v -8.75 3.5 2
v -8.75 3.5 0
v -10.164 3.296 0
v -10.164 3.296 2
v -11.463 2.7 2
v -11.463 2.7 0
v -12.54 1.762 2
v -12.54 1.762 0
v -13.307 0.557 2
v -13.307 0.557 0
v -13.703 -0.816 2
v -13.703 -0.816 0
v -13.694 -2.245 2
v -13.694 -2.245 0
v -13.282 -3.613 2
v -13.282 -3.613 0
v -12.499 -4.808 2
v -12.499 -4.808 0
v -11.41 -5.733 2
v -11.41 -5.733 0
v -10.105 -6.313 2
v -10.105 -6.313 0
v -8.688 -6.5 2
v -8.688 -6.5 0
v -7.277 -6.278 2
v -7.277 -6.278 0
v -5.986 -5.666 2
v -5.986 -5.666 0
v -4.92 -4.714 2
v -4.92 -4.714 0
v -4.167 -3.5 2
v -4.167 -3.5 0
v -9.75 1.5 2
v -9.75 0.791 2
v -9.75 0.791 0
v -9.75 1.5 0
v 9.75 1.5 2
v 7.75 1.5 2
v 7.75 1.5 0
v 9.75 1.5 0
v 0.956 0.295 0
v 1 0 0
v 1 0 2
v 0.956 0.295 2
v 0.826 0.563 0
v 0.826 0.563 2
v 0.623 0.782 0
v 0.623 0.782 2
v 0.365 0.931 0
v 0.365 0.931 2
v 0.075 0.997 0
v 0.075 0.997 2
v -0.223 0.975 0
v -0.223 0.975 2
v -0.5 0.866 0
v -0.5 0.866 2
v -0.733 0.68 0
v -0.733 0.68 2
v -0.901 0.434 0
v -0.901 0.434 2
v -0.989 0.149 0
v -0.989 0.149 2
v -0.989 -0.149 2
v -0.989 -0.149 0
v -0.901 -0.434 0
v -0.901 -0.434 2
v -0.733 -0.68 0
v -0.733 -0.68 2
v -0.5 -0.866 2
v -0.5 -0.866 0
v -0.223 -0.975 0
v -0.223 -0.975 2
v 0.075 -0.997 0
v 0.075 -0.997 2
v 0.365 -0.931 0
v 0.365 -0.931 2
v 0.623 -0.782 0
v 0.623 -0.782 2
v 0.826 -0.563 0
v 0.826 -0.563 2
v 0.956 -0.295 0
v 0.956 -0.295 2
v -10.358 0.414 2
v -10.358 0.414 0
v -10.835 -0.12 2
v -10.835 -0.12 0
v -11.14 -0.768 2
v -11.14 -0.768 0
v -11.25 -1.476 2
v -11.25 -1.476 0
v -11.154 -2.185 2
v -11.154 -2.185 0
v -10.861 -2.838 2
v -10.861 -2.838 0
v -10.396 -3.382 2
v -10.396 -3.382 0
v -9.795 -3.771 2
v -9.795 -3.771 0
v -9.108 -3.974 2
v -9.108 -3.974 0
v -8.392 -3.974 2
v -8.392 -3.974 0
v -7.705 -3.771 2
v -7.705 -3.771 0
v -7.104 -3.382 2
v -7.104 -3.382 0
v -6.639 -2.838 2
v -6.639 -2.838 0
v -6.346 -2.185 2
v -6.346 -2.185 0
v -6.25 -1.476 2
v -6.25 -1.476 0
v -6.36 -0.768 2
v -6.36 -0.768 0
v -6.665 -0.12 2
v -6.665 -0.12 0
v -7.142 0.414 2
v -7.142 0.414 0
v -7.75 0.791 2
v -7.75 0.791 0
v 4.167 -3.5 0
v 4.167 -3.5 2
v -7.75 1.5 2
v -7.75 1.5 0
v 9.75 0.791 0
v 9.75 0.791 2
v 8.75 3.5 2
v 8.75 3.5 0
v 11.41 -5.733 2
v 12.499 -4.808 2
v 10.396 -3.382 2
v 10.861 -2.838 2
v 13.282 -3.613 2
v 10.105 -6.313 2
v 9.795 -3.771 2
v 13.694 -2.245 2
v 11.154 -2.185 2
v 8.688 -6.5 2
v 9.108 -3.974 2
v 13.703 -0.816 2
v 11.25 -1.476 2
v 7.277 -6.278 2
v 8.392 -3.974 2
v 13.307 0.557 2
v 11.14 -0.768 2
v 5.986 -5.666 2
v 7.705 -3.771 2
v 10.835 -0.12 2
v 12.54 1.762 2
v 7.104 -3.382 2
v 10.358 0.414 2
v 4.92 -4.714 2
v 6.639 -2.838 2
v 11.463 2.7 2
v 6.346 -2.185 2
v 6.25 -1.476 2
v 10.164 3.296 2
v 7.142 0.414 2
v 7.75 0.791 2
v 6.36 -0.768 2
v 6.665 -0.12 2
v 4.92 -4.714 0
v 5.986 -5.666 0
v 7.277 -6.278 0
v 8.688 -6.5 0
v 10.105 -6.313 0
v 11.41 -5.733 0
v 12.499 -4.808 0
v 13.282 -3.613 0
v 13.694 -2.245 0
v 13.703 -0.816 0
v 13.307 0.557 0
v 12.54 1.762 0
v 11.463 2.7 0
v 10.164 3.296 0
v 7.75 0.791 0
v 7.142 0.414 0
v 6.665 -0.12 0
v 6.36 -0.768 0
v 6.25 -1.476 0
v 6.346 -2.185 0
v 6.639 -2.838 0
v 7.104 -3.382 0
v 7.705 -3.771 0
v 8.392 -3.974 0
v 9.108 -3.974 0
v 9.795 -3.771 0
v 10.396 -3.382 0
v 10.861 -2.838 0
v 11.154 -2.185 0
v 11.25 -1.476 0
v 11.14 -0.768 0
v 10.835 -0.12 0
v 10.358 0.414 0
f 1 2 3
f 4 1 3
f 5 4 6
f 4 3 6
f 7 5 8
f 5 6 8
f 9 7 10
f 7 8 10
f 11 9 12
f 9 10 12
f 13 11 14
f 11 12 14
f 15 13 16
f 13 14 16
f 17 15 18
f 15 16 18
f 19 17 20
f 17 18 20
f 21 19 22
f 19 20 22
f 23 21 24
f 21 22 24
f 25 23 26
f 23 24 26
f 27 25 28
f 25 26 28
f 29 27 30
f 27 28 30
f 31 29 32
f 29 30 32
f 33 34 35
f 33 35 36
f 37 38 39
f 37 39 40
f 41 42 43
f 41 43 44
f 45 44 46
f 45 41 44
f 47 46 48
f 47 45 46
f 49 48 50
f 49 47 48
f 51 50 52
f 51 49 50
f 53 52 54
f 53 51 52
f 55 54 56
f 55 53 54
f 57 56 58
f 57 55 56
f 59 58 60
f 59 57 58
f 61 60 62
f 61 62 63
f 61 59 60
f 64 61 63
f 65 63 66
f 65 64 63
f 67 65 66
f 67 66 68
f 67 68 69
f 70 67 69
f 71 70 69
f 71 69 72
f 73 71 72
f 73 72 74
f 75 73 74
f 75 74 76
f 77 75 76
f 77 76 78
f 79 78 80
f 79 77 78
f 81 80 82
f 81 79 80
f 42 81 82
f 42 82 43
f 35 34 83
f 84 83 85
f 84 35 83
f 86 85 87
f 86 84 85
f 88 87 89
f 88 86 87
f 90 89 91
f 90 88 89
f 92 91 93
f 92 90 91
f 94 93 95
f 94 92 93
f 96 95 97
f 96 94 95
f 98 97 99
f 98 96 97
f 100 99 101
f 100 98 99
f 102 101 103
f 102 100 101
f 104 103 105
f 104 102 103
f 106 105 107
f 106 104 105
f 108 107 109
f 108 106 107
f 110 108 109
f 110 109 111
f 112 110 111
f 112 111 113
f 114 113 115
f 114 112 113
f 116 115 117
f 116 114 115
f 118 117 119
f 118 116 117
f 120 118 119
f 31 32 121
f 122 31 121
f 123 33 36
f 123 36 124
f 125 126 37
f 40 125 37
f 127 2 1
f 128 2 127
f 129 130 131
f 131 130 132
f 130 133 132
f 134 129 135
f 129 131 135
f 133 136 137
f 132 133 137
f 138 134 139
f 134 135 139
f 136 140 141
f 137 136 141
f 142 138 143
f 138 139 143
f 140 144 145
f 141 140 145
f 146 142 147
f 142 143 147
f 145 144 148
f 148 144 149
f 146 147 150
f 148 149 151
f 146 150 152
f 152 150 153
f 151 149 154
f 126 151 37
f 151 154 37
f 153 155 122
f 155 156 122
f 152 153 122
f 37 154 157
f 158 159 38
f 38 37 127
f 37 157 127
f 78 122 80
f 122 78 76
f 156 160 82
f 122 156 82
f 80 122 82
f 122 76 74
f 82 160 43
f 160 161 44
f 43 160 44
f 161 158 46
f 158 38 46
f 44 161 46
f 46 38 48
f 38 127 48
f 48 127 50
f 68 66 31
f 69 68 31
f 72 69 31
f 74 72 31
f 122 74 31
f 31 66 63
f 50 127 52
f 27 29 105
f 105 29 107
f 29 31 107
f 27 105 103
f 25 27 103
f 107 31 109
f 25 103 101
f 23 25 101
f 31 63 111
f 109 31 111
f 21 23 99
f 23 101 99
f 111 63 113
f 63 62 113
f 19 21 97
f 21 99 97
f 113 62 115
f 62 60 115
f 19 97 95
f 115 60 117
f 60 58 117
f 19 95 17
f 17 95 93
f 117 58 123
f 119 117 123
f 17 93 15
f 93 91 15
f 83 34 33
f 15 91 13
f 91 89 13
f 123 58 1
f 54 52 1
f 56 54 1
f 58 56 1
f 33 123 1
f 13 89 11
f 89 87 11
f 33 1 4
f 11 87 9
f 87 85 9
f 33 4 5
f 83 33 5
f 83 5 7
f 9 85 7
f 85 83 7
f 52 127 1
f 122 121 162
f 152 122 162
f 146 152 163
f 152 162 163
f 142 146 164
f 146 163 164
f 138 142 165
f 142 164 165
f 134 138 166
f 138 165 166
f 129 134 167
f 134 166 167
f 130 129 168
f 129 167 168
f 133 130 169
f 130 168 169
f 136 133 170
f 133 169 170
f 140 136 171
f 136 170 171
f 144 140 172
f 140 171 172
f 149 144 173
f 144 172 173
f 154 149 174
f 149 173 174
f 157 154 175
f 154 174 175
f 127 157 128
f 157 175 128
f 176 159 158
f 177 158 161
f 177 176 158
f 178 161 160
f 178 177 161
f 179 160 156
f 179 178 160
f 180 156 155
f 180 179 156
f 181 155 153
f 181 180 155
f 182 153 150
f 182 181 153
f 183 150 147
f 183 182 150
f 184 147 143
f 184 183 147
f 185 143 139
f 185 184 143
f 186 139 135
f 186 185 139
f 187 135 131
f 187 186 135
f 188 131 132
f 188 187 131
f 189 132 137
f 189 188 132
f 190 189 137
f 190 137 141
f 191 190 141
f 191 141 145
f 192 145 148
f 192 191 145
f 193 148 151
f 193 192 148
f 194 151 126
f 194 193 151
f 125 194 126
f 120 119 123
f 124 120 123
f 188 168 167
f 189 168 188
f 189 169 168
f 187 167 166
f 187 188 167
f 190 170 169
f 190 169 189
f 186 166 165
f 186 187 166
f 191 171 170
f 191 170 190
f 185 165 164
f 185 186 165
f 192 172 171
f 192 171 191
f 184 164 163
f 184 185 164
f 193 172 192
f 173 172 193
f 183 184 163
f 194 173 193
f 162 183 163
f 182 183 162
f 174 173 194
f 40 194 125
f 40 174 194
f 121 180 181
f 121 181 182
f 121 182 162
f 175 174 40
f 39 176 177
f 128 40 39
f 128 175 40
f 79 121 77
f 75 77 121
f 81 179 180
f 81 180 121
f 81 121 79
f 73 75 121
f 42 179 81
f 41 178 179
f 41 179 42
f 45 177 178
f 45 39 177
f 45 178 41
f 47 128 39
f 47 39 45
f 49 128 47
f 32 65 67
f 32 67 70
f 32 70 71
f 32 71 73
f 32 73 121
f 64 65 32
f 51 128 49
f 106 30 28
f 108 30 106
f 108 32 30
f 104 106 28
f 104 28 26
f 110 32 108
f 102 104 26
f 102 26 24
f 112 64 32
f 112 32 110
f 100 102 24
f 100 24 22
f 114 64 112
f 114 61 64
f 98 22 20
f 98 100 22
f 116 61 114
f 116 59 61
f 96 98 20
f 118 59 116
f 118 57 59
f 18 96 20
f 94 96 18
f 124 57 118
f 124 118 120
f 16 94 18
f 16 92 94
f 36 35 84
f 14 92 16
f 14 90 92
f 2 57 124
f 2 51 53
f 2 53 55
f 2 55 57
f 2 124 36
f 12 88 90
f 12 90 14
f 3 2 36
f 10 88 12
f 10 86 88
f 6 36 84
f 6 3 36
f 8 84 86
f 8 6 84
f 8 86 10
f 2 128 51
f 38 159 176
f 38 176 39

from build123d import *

# Parameters (mm, degrees)
SKETCH_R     = 1
SKETCH_R_2   = 2.5
PAD_DEPTH    = 2
SKETCH001_W  = 2
SKETCH001_H  = 2
POCKET_DEPTH = 2.001


with BuildPart() as part:
    # Sketch → Pad (new body)
    with BuildSketch(Plane.XY):
        with BuildLine():
            Line((-8.75, 3.5), (8.75, 3.5))
            ThreePointArc((4.167424, -3.5), (12.9333, -4.238613), (8.75, 3.5))
            Line((-4.167424, -3.5), (4.167424, -3.5))
            ThreePointArc((-8.75, 3.5), (-12.9333, -4.238613), (-4.167424, -3.5))
        make_face()
        Circle(SKETCH_R, mode=Mode.SUBTRACT)
        with Locations((-8.75, -1.5)):
            Circle(SKETCH_R_2, mode=Mode.SUBTRACT)
        with Locations((8.75, -1.5)):
            Circle(SKETCH_R_2, mode=Mode.SUBTRACT)
    extrude(amount=PAD_DEPTH)

    # Sketch001 → Pocket (cut, through all)
    with BuildSketch(Plane.XY.offset(2)):
        with Locations((-8.75, 0.5)):
            Rectangle(SKETCH001_W, SKETCH001_H)
        with Locations((8.75, 0.5)):
            Rectangle(SKETCH001_W, SKETCH001_H)
    extrude(amount=-POCKET_DEPTH, mode=Mode.SUBTRACT)


solid = part.part
